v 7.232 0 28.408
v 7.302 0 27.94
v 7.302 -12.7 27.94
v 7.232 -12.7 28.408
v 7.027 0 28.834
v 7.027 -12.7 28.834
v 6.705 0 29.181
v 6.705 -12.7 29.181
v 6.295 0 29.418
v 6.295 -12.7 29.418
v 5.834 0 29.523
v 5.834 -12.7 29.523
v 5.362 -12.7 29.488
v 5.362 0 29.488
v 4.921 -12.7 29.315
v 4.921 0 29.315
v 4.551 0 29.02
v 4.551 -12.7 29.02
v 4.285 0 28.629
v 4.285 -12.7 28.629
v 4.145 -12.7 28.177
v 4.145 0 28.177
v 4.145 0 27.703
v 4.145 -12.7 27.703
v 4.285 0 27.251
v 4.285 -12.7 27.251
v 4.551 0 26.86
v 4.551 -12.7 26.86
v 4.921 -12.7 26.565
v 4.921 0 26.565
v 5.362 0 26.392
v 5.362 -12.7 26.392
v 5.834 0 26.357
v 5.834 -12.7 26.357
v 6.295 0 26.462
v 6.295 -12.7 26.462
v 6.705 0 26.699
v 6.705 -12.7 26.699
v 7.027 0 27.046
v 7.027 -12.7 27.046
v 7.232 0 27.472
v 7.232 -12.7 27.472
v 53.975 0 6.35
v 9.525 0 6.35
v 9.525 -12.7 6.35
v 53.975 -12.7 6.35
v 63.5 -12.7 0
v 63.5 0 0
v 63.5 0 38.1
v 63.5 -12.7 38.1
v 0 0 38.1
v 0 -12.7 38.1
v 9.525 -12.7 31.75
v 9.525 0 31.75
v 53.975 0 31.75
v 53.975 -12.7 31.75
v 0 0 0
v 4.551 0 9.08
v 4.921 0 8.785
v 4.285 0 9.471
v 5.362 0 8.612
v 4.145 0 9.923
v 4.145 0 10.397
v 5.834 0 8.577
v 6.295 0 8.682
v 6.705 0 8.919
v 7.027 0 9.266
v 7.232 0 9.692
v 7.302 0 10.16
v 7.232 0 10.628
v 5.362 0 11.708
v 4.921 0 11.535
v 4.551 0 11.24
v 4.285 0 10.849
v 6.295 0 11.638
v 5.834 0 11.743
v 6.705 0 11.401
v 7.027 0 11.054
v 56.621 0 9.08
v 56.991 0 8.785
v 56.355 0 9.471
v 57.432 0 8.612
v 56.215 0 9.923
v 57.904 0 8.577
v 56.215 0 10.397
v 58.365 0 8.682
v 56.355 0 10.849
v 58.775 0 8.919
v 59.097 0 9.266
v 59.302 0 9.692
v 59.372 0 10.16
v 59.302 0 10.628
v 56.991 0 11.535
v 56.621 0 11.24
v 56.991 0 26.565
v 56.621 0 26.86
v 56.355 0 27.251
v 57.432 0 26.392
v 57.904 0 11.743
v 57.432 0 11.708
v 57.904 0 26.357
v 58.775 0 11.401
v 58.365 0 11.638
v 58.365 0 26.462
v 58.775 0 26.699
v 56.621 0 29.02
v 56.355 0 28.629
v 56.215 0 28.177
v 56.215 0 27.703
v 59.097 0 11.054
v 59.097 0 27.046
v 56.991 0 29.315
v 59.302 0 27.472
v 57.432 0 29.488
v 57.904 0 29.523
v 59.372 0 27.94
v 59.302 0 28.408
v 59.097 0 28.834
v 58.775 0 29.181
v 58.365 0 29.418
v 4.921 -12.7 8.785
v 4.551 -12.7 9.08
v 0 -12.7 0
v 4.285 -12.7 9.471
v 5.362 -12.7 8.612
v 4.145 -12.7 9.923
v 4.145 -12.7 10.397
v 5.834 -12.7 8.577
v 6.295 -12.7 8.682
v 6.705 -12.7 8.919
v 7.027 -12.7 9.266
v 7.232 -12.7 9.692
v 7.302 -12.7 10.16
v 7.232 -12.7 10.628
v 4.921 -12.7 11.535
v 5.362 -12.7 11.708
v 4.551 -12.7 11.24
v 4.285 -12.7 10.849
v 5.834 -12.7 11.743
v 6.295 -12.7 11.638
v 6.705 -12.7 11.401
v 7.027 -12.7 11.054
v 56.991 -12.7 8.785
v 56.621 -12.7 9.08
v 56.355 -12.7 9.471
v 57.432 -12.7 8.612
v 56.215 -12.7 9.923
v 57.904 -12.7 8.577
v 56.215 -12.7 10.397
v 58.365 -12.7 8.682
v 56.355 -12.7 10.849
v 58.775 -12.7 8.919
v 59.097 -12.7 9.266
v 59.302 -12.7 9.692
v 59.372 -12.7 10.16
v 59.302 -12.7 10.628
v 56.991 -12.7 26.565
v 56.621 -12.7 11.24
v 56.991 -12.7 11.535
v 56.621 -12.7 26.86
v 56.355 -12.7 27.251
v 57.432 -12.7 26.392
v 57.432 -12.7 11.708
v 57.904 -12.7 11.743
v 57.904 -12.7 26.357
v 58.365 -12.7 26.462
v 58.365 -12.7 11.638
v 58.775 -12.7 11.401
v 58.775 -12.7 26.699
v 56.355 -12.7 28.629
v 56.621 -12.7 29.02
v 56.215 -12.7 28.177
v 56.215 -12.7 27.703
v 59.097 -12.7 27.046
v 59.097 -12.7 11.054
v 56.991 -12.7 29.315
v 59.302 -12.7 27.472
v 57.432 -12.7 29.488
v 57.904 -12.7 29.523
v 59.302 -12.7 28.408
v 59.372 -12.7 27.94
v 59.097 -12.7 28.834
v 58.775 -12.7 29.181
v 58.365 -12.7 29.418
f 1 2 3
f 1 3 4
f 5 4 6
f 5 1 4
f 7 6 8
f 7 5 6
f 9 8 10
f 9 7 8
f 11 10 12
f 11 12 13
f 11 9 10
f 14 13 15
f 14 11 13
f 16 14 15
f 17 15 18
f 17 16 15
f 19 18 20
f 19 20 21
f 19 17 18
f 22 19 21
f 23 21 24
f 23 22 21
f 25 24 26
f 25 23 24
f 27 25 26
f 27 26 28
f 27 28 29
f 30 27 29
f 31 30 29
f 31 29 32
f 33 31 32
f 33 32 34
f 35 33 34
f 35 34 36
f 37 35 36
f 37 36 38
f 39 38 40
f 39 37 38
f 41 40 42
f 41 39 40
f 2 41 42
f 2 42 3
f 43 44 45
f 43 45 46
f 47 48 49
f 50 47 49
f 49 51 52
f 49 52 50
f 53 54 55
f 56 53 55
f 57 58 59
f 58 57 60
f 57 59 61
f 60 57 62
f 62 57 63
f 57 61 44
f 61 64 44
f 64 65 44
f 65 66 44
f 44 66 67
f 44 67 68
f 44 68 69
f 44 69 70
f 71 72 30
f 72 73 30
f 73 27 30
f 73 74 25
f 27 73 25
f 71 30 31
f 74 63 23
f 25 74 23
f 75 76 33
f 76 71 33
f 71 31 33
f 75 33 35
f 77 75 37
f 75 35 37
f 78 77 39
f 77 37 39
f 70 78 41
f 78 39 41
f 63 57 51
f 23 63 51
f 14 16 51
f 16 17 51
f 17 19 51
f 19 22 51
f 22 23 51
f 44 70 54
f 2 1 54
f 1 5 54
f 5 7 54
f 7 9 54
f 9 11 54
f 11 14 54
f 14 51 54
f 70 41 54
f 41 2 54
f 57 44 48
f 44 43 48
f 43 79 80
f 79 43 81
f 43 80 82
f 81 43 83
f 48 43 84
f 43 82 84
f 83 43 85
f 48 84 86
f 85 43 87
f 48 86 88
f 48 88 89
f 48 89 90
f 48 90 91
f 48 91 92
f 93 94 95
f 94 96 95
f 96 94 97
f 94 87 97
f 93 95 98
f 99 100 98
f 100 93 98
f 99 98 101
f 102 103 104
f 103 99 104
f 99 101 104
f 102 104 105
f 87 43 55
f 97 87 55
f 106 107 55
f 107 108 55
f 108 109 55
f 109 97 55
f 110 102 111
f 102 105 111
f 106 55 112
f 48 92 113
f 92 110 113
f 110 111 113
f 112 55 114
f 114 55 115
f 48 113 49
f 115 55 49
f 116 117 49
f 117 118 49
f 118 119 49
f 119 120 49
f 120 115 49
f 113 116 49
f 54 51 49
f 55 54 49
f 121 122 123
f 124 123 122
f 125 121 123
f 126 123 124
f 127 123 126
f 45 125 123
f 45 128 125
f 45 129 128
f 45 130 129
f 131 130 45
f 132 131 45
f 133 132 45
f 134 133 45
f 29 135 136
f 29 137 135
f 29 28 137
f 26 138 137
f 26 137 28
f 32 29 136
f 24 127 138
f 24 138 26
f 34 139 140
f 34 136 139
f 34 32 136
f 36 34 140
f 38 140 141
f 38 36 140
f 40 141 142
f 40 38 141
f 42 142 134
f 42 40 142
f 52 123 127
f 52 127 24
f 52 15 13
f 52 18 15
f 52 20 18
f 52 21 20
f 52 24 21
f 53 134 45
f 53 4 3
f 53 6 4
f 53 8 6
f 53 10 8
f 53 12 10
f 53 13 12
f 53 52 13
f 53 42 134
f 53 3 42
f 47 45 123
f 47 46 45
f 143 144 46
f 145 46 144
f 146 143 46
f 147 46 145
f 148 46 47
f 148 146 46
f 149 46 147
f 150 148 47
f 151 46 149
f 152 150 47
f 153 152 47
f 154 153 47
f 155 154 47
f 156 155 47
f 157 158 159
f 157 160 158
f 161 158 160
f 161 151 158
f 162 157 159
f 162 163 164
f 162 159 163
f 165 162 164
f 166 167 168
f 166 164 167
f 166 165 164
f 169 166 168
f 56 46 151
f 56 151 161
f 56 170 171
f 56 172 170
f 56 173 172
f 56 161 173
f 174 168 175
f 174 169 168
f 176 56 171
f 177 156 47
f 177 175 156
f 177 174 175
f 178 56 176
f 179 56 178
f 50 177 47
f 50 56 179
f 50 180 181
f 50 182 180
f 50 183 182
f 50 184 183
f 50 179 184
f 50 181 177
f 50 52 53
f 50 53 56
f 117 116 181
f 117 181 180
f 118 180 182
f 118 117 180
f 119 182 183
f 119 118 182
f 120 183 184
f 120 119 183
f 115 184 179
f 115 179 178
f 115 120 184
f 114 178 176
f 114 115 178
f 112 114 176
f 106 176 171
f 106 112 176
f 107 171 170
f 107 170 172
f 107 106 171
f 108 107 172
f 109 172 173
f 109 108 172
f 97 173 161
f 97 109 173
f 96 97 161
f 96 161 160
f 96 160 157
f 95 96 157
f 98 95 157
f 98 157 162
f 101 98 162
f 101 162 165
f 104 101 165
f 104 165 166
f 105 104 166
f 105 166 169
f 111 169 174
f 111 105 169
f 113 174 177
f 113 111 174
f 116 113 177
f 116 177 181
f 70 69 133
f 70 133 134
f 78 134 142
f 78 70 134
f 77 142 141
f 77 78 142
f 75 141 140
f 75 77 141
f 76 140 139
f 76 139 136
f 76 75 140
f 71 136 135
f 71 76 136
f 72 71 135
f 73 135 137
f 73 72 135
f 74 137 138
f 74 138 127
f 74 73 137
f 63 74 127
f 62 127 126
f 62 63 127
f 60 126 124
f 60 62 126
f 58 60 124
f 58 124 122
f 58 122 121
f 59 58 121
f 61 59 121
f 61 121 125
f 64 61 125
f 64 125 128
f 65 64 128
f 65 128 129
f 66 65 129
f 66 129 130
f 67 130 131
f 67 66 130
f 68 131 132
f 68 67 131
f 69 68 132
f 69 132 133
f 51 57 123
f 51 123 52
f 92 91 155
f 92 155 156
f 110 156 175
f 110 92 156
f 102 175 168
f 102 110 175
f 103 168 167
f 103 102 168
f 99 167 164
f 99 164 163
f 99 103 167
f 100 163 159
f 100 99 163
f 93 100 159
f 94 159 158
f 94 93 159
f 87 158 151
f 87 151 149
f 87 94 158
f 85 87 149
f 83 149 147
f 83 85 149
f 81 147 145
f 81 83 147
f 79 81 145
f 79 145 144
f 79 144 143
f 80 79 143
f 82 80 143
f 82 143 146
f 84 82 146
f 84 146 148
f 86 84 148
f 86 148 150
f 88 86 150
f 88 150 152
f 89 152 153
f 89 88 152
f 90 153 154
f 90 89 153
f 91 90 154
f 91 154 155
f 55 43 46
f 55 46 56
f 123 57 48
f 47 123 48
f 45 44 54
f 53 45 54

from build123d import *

# Parameters (mm, degrees)
F0_W     = 63.5
F0_H     = 38.1
F0_R     = 1.5875
F0_W_2   = 44.45
F0_H_2   = 25.4
F1_DEPTH = 12.7


with BuildPart() as f1:
    # F0 (on Front) → F1 (new body)
    with BuildSketch(Plane.XZ):
        with Locations((31.75, 19.05)):
            Rectangle(F0_W, F0_H)
        with Locations((5.715, 10.16)):
            Circle(F0_R, mode=Mode.SUBTRACT)
        with Locations((57.785, 10.16)):
            Circle(F0_R, mode=Mode.SUBTRACT)
        with Locations((5.715, 27.94)):
            Circle(F0_R, mode=Mode.SUBTRACT)
        with Locations((31.75, 19.05)):
            Rectangle(F0_W_2, F0_H_2, mode=Mode.SUBTRACT)
        with Locations((57.785, 27.94)):
            Circle(F0_R, mode=Mode.SUBTRACT)
    extrude(amount=F1_DEPTH)


solid = f1.part
